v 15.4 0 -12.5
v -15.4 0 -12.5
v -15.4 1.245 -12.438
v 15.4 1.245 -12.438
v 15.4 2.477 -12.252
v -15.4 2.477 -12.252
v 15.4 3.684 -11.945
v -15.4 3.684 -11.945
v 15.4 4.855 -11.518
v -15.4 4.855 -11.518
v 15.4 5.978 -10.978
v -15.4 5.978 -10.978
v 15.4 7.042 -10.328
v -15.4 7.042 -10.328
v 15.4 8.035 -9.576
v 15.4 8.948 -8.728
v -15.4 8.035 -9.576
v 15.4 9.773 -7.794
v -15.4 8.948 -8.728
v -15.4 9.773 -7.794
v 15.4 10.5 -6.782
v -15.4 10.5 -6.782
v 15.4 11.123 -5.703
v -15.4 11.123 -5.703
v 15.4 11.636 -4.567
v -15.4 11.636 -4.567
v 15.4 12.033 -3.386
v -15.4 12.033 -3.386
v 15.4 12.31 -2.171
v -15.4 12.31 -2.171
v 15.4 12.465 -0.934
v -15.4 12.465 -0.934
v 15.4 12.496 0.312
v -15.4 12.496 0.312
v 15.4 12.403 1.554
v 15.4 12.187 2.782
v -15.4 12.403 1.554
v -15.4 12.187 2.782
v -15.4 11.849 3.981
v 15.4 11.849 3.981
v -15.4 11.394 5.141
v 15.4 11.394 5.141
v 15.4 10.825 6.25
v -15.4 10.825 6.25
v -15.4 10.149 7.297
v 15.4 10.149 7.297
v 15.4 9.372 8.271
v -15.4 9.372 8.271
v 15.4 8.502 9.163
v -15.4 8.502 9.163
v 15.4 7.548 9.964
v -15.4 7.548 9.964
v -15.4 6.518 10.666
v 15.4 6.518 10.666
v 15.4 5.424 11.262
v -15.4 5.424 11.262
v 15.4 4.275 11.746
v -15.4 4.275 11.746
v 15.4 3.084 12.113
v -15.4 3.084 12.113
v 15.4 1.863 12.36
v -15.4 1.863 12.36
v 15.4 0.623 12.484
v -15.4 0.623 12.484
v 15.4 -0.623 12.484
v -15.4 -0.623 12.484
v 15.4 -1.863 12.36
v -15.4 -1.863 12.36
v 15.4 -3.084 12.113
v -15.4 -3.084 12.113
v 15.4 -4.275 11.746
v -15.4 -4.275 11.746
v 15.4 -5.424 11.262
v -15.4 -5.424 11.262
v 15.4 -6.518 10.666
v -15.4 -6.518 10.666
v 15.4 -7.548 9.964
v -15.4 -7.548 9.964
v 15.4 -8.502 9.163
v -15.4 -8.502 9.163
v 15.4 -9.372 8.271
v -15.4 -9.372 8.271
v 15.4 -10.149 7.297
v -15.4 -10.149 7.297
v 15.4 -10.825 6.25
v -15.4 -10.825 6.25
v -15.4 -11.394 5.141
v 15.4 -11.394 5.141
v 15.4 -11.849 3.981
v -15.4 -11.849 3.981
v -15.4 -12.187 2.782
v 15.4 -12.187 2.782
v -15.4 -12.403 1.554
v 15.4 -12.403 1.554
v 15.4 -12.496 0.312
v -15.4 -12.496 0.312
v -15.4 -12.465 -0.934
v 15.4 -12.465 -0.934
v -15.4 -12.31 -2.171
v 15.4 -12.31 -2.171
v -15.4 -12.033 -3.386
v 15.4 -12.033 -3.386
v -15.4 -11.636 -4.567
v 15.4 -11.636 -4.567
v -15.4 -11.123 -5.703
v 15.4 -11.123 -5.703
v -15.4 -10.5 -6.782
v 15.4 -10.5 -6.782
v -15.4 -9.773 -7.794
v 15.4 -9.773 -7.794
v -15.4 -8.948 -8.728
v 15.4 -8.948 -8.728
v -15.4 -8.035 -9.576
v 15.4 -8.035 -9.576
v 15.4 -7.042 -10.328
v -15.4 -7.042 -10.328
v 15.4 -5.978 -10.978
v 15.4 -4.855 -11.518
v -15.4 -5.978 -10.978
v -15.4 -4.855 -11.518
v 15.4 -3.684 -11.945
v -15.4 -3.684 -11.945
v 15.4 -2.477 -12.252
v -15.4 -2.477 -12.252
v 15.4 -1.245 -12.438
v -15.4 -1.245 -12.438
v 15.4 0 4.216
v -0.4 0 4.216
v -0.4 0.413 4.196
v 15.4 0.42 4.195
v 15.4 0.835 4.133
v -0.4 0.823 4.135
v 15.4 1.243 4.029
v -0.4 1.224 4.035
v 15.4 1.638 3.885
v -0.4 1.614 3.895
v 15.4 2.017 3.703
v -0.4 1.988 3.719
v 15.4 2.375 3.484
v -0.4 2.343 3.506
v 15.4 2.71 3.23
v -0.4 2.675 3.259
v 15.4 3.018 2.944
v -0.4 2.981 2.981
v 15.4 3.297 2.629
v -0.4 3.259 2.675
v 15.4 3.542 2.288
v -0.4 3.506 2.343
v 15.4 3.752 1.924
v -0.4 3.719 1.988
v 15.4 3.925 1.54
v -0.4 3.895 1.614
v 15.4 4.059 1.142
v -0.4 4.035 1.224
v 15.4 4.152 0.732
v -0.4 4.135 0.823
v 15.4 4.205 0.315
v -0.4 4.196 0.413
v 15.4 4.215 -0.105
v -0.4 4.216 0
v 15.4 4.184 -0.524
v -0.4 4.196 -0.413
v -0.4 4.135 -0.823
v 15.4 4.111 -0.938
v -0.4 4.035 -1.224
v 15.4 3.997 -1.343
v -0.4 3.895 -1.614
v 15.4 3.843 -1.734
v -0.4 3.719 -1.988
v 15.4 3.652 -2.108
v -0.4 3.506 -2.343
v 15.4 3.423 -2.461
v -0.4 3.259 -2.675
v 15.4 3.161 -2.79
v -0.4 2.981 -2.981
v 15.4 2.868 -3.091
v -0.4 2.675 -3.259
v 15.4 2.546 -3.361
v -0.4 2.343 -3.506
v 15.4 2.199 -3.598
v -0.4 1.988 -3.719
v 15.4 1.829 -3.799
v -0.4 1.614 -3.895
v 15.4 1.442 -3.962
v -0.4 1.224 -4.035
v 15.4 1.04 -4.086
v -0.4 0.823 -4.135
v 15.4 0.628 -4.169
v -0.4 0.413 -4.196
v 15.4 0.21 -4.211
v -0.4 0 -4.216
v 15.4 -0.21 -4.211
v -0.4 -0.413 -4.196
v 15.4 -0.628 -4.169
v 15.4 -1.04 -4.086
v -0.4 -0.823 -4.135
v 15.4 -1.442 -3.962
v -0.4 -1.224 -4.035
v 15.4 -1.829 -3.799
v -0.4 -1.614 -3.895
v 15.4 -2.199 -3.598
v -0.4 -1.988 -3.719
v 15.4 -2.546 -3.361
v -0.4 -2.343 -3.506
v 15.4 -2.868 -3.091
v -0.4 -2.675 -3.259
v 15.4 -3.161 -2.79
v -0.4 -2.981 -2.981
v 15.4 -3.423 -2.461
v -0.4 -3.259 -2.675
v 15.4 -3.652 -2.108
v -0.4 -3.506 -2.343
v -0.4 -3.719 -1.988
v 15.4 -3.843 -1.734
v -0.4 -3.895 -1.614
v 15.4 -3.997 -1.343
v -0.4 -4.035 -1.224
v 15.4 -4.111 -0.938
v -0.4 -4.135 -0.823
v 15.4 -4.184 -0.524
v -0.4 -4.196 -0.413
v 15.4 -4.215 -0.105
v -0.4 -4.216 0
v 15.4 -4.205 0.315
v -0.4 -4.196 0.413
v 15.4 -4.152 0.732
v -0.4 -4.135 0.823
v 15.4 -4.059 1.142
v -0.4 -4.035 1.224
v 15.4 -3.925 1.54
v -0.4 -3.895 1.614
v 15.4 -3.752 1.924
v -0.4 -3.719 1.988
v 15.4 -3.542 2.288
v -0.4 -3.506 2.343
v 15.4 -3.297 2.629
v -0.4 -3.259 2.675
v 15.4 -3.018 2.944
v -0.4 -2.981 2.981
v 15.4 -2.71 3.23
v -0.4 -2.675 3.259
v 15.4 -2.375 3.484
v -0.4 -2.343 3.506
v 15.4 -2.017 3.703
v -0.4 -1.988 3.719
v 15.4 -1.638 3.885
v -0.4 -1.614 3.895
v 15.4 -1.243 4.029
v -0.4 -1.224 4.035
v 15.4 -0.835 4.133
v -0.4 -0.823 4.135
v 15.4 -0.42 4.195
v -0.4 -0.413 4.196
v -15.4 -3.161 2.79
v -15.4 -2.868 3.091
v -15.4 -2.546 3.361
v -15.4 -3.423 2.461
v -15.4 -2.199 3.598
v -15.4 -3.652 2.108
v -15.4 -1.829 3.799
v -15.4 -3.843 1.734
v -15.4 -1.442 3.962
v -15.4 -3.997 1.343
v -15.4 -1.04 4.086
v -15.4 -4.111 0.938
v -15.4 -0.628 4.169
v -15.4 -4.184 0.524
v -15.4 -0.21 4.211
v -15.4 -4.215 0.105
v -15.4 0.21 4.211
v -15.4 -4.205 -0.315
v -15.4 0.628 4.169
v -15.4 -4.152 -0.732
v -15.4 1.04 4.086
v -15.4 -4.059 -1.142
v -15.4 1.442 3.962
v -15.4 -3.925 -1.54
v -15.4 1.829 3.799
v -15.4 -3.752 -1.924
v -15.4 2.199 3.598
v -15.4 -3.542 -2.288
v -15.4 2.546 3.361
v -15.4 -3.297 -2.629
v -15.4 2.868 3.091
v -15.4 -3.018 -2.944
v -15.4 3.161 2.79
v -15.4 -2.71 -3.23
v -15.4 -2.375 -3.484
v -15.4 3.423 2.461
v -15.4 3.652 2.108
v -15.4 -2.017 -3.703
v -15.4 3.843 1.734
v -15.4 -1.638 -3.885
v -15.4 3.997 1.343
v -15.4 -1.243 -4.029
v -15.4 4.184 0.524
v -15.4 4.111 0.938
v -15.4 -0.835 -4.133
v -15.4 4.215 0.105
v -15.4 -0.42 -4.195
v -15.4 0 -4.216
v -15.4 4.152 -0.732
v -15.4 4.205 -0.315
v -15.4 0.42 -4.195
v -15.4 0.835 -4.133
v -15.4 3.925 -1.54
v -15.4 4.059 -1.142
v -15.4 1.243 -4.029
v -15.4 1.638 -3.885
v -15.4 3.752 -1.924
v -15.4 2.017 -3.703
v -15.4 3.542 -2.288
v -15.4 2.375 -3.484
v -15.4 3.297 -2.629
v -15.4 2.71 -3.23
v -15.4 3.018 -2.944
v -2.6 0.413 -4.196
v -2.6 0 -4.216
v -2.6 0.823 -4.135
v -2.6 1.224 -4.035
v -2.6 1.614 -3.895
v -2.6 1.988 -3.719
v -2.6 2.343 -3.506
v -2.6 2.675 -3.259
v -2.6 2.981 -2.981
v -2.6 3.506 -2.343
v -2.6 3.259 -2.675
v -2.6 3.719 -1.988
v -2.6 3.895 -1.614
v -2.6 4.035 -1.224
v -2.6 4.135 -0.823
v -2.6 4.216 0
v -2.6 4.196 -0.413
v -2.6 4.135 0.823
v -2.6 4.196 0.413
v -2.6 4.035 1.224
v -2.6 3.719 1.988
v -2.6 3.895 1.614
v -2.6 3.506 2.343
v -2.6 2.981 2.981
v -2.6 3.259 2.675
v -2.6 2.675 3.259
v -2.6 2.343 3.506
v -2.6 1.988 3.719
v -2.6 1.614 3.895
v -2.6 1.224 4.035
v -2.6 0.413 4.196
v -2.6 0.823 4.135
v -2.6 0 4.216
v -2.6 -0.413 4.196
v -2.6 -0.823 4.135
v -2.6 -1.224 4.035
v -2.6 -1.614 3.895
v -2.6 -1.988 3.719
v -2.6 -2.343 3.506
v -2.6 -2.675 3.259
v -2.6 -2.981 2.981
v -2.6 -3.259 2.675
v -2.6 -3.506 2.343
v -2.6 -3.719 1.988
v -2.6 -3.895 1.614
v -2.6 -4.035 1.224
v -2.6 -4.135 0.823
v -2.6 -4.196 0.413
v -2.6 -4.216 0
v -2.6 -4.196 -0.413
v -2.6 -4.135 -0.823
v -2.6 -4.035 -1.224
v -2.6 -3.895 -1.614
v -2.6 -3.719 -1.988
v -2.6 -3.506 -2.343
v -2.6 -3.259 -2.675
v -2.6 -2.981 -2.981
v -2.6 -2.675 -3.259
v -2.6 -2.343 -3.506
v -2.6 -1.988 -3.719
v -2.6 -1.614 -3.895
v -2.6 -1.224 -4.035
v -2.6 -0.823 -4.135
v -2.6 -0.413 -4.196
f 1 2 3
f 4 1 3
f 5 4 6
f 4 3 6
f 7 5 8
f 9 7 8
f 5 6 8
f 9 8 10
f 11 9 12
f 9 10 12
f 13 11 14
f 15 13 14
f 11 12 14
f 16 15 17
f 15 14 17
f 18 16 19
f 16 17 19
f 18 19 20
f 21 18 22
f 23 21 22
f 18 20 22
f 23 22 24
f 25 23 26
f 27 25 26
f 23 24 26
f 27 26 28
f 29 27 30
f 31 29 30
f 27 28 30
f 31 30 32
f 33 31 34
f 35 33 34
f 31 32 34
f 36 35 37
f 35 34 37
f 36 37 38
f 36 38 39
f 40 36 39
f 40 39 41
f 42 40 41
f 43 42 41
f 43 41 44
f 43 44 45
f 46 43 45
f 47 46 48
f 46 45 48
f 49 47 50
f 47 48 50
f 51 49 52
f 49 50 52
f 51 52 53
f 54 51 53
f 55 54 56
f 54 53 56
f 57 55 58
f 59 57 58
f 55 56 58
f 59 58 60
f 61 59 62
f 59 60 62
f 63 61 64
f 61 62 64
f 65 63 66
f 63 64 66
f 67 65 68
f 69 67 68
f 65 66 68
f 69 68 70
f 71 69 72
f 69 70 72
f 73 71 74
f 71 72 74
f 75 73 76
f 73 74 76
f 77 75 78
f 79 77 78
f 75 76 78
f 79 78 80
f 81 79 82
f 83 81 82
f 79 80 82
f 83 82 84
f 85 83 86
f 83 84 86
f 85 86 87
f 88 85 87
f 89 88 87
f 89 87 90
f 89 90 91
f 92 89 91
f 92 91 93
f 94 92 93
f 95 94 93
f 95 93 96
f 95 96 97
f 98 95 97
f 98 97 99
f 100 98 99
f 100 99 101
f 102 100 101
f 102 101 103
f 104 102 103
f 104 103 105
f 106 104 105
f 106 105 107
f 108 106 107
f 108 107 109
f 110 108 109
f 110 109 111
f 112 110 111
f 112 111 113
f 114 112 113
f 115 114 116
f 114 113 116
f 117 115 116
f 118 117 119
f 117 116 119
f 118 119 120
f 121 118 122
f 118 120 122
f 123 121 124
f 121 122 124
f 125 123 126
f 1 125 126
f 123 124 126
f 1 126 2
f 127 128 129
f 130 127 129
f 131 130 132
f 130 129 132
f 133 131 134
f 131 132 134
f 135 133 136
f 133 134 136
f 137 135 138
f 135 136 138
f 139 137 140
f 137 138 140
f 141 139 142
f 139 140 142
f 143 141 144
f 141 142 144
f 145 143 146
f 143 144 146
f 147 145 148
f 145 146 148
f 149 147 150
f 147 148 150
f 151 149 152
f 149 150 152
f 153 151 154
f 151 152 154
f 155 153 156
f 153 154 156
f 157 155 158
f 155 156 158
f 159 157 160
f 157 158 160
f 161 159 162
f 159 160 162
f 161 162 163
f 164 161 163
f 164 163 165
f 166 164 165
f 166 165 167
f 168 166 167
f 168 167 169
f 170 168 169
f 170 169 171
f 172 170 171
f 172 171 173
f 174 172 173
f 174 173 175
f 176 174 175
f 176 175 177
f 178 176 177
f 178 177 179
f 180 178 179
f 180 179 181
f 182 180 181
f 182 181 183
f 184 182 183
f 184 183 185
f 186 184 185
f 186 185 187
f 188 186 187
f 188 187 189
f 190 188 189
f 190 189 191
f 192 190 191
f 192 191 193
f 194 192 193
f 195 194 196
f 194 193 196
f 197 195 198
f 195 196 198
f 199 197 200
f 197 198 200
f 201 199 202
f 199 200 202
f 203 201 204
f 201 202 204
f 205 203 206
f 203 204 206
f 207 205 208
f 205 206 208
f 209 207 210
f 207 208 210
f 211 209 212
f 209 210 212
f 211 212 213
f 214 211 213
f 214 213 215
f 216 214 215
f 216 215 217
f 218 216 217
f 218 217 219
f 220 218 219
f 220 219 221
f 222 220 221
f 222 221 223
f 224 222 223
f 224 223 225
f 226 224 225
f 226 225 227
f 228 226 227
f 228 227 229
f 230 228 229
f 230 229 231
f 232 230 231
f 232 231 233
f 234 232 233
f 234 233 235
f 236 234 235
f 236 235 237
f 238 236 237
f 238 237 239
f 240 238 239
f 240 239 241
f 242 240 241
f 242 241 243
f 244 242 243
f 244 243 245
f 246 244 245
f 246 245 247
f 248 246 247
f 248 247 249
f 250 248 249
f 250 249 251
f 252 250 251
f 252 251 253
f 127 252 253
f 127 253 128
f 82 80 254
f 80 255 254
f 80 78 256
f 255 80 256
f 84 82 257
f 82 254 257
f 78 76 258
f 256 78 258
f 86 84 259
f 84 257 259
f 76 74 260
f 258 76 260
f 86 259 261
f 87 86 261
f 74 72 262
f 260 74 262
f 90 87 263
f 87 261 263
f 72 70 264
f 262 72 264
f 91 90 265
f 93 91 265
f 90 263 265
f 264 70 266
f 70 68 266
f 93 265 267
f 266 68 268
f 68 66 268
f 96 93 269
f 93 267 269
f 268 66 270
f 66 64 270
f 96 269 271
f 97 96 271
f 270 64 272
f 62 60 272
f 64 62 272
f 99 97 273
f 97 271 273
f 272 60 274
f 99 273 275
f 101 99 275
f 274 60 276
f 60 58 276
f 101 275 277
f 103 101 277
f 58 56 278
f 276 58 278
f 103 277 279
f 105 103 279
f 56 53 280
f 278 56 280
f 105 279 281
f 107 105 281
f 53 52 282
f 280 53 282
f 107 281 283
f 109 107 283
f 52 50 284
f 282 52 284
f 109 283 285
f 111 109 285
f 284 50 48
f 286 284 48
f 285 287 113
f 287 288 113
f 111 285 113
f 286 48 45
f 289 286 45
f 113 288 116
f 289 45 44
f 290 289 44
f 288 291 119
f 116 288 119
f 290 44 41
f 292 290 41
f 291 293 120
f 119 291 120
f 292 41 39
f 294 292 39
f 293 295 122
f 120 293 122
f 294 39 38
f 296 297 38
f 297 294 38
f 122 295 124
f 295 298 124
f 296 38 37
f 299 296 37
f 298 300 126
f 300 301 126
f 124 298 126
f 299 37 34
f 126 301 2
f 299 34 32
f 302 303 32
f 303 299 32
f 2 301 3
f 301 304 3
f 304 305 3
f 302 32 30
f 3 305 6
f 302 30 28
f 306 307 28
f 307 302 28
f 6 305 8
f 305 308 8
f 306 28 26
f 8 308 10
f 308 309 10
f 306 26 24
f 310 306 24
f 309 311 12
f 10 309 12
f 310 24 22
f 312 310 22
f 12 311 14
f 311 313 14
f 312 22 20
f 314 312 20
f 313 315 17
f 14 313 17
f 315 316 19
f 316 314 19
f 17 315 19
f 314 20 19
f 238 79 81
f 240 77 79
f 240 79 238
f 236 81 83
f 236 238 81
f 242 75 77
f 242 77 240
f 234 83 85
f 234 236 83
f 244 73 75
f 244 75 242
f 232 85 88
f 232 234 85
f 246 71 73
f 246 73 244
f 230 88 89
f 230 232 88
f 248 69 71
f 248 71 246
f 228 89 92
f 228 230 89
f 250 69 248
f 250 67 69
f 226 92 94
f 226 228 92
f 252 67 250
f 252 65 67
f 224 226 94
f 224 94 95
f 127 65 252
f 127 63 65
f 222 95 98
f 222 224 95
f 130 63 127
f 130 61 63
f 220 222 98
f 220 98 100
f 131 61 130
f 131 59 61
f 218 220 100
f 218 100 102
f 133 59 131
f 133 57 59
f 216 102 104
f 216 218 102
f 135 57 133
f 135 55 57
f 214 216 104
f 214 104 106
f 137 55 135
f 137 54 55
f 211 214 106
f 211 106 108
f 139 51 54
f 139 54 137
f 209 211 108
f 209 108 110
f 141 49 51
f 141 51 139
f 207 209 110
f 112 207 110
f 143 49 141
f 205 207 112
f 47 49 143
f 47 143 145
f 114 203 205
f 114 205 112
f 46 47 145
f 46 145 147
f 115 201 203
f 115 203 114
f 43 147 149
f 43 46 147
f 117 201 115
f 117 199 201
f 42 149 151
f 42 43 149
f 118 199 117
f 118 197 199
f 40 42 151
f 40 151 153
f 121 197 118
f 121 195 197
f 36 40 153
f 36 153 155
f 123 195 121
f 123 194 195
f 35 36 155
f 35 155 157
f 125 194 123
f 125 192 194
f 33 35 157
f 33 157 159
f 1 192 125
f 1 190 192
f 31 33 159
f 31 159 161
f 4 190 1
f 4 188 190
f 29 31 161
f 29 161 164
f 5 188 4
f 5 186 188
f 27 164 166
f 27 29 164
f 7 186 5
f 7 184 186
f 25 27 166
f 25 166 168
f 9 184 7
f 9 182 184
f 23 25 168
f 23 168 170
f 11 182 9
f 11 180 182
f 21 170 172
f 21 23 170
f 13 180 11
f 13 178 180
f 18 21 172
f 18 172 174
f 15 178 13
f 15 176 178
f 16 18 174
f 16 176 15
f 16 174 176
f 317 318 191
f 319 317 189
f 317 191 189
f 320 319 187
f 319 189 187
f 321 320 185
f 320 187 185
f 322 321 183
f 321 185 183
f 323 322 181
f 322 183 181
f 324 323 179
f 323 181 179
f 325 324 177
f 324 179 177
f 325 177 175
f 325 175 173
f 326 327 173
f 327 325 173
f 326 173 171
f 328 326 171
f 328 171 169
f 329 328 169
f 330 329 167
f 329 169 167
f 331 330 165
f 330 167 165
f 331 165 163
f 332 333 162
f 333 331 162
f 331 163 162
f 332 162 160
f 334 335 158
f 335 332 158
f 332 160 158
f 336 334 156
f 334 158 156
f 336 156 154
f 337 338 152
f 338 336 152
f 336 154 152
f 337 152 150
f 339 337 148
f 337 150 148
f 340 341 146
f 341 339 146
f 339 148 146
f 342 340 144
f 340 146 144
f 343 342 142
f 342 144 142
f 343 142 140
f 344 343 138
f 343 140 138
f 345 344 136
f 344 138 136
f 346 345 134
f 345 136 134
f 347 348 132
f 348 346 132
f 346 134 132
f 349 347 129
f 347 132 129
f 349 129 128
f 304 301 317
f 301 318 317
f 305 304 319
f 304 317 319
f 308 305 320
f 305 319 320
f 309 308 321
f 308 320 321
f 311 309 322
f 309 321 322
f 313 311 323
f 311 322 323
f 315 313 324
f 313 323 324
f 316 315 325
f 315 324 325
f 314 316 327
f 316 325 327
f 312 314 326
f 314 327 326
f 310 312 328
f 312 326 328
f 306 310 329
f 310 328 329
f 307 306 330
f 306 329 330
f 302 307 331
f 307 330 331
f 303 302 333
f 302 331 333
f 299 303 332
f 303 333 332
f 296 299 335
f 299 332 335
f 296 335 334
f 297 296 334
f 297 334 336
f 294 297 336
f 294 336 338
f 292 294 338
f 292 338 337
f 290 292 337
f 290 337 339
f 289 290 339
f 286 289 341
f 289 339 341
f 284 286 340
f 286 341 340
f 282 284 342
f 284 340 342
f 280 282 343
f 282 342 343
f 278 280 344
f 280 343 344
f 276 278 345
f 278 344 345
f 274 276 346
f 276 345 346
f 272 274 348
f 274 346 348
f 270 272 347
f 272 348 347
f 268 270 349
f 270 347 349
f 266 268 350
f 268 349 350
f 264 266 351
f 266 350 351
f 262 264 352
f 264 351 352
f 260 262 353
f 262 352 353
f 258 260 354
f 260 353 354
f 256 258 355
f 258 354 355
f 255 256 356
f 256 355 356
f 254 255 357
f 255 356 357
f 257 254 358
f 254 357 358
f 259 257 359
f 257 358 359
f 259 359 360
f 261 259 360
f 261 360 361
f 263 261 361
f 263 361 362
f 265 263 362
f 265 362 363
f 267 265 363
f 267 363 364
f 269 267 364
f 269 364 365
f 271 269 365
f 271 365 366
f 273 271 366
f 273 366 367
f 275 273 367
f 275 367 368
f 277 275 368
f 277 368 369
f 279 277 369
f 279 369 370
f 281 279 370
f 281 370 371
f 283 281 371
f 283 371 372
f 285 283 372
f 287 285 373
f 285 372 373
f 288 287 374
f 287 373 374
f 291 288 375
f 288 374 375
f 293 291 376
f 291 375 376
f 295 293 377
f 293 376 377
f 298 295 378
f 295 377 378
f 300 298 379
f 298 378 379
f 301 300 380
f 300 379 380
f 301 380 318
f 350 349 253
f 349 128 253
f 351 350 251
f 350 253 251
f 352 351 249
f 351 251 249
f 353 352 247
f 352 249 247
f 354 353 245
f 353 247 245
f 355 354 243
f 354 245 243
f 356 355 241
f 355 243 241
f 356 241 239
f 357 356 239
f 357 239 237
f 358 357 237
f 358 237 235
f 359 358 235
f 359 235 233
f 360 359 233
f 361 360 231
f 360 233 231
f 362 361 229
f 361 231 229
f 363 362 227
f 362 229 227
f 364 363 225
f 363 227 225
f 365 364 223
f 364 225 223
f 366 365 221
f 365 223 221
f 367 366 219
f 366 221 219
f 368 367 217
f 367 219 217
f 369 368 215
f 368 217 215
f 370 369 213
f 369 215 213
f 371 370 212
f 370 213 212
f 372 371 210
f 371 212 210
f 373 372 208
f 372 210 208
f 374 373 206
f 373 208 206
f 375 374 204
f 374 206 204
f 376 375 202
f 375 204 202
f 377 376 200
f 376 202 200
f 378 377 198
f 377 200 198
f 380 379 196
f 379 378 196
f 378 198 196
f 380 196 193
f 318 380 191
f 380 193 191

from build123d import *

# Parameters (mm, degrees)
EXTRUDE1_START              = -15.4
SKETCH1_R                   = 12.5
EXTRUDE1_DEPTH              = 30.8
F_3_8_24_TAPPED_HOLE3_D     = 8.4328
F_3_8_24_TAPPED_HOLE3_DEPTH = 15
F_3_8_24_TAPPED_HOLE3_TIP   = 2.533468714
F_3_8_24_TAPPED_HOLE4_D     = 8.4328
F_3_8_24_TAPPED_HOLE4_DEPTH = 18
F_3_8_24_TAPPED_HOLE4_TIP   = 2.533468714


with BuildPart() as part:
    # Sketch1 → Extrude1 (new body)
    with BuildSketch(Plane(origin=(0, 0, 0), x_dir=(0, 0, -1), z_dir=(1, 0, 0)).offset(EXTRUDE1_START)):
        Circle(SKETCH1_R)
    extrude(amount=EXTRUDE1_DEPTH)

    # 3_8-24 Tapped Hole3
    with Locations(Plane.ZY.offset(15.4)):
        with Locations((0, 0)):
            Hole(F_3_8_24_TAPPED_HOLE3_D / 2, depth=F_3_8_24_TAPPED_HOLE3_DEPTH)
            with Locations((0, 0, -(F_3_8_24_TAPPED_HOLE3_DEPTH + F_3_8_24_TAPPED_HOLE3_TIP / 2))):  # 118° drill point
                Cone(0, F_3_8_24_TAPPED_HOLE3_D / 2, F_3_8_24_TAPPED_HOLE3_TIP, mode=Mode.SUBTRACT)

    # 3_8-24 Tapped Hole4
    with Locations(Plane(origin=(15.4, 0, 0), x_dir=(0, 0, -1), z_dir=(1, 0, 0))):
        with Locations((0, 0)):
            Hole(F_3_8_24_TAPPED_HOLE4_D / 2, depth=F_3_8_24_TAPPED_HOLE4_DEPTH)
            with Locations((0, 0, -(F_3_8_24_TAPPED_HOLE4_DEPTH + F_3_8_24_TAPPED_HOLE4_TIP / 2))):  # 118° drill point
                Cone(0, F_3_8_24_TAPPED_HOLE4_D / 2, F_3_8_24_TAPPED_HOLE4_TIP, mode=Mode.SUBTRACT)


solid = part.part
